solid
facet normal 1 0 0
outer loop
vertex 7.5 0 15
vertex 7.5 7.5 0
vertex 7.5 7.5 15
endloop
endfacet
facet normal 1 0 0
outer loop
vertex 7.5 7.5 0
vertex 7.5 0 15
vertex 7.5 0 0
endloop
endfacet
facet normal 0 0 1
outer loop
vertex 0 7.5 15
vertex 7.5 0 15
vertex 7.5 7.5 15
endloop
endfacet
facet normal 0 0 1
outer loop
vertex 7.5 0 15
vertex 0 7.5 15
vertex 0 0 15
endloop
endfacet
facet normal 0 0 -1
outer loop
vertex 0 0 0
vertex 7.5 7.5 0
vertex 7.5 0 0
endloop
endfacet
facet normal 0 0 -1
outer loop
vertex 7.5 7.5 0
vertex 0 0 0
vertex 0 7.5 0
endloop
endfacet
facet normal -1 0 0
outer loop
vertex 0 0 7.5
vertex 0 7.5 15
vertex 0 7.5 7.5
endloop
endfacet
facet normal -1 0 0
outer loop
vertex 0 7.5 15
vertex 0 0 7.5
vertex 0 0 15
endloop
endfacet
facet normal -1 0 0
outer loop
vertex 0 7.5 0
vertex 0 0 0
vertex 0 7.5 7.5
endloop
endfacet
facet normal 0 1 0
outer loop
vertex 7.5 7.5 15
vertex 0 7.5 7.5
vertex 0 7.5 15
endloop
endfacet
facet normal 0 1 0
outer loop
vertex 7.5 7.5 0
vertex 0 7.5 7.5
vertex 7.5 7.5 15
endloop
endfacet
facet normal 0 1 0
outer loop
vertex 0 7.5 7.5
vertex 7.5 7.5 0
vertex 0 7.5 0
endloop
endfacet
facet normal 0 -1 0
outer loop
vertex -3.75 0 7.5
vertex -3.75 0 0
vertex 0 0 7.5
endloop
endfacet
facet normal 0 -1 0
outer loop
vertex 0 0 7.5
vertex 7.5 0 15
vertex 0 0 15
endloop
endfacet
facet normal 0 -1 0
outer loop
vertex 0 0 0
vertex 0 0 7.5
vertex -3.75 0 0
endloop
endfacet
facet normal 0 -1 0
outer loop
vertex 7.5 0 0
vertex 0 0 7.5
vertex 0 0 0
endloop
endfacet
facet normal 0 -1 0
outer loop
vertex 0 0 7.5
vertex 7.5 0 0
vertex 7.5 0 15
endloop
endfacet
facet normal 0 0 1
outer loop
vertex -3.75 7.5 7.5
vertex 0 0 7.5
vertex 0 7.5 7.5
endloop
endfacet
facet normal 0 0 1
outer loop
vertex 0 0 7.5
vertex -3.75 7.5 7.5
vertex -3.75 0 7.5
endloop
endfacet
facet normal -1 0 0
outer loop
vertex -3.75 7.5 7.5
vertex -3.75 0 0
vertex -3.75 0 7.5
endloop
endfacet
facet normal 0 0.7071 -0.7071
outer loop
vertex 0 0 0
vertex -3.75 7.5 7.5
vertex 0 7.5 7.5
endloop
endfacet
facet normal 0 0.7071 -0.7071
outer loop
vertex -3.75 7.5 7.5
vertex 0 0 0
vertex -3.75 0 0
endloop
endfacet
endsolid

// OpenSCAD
use <../nscad-lib.scad>

color("lightgray") cube([7.5, 7.5, 15]);
color("orange") zoverhang();
